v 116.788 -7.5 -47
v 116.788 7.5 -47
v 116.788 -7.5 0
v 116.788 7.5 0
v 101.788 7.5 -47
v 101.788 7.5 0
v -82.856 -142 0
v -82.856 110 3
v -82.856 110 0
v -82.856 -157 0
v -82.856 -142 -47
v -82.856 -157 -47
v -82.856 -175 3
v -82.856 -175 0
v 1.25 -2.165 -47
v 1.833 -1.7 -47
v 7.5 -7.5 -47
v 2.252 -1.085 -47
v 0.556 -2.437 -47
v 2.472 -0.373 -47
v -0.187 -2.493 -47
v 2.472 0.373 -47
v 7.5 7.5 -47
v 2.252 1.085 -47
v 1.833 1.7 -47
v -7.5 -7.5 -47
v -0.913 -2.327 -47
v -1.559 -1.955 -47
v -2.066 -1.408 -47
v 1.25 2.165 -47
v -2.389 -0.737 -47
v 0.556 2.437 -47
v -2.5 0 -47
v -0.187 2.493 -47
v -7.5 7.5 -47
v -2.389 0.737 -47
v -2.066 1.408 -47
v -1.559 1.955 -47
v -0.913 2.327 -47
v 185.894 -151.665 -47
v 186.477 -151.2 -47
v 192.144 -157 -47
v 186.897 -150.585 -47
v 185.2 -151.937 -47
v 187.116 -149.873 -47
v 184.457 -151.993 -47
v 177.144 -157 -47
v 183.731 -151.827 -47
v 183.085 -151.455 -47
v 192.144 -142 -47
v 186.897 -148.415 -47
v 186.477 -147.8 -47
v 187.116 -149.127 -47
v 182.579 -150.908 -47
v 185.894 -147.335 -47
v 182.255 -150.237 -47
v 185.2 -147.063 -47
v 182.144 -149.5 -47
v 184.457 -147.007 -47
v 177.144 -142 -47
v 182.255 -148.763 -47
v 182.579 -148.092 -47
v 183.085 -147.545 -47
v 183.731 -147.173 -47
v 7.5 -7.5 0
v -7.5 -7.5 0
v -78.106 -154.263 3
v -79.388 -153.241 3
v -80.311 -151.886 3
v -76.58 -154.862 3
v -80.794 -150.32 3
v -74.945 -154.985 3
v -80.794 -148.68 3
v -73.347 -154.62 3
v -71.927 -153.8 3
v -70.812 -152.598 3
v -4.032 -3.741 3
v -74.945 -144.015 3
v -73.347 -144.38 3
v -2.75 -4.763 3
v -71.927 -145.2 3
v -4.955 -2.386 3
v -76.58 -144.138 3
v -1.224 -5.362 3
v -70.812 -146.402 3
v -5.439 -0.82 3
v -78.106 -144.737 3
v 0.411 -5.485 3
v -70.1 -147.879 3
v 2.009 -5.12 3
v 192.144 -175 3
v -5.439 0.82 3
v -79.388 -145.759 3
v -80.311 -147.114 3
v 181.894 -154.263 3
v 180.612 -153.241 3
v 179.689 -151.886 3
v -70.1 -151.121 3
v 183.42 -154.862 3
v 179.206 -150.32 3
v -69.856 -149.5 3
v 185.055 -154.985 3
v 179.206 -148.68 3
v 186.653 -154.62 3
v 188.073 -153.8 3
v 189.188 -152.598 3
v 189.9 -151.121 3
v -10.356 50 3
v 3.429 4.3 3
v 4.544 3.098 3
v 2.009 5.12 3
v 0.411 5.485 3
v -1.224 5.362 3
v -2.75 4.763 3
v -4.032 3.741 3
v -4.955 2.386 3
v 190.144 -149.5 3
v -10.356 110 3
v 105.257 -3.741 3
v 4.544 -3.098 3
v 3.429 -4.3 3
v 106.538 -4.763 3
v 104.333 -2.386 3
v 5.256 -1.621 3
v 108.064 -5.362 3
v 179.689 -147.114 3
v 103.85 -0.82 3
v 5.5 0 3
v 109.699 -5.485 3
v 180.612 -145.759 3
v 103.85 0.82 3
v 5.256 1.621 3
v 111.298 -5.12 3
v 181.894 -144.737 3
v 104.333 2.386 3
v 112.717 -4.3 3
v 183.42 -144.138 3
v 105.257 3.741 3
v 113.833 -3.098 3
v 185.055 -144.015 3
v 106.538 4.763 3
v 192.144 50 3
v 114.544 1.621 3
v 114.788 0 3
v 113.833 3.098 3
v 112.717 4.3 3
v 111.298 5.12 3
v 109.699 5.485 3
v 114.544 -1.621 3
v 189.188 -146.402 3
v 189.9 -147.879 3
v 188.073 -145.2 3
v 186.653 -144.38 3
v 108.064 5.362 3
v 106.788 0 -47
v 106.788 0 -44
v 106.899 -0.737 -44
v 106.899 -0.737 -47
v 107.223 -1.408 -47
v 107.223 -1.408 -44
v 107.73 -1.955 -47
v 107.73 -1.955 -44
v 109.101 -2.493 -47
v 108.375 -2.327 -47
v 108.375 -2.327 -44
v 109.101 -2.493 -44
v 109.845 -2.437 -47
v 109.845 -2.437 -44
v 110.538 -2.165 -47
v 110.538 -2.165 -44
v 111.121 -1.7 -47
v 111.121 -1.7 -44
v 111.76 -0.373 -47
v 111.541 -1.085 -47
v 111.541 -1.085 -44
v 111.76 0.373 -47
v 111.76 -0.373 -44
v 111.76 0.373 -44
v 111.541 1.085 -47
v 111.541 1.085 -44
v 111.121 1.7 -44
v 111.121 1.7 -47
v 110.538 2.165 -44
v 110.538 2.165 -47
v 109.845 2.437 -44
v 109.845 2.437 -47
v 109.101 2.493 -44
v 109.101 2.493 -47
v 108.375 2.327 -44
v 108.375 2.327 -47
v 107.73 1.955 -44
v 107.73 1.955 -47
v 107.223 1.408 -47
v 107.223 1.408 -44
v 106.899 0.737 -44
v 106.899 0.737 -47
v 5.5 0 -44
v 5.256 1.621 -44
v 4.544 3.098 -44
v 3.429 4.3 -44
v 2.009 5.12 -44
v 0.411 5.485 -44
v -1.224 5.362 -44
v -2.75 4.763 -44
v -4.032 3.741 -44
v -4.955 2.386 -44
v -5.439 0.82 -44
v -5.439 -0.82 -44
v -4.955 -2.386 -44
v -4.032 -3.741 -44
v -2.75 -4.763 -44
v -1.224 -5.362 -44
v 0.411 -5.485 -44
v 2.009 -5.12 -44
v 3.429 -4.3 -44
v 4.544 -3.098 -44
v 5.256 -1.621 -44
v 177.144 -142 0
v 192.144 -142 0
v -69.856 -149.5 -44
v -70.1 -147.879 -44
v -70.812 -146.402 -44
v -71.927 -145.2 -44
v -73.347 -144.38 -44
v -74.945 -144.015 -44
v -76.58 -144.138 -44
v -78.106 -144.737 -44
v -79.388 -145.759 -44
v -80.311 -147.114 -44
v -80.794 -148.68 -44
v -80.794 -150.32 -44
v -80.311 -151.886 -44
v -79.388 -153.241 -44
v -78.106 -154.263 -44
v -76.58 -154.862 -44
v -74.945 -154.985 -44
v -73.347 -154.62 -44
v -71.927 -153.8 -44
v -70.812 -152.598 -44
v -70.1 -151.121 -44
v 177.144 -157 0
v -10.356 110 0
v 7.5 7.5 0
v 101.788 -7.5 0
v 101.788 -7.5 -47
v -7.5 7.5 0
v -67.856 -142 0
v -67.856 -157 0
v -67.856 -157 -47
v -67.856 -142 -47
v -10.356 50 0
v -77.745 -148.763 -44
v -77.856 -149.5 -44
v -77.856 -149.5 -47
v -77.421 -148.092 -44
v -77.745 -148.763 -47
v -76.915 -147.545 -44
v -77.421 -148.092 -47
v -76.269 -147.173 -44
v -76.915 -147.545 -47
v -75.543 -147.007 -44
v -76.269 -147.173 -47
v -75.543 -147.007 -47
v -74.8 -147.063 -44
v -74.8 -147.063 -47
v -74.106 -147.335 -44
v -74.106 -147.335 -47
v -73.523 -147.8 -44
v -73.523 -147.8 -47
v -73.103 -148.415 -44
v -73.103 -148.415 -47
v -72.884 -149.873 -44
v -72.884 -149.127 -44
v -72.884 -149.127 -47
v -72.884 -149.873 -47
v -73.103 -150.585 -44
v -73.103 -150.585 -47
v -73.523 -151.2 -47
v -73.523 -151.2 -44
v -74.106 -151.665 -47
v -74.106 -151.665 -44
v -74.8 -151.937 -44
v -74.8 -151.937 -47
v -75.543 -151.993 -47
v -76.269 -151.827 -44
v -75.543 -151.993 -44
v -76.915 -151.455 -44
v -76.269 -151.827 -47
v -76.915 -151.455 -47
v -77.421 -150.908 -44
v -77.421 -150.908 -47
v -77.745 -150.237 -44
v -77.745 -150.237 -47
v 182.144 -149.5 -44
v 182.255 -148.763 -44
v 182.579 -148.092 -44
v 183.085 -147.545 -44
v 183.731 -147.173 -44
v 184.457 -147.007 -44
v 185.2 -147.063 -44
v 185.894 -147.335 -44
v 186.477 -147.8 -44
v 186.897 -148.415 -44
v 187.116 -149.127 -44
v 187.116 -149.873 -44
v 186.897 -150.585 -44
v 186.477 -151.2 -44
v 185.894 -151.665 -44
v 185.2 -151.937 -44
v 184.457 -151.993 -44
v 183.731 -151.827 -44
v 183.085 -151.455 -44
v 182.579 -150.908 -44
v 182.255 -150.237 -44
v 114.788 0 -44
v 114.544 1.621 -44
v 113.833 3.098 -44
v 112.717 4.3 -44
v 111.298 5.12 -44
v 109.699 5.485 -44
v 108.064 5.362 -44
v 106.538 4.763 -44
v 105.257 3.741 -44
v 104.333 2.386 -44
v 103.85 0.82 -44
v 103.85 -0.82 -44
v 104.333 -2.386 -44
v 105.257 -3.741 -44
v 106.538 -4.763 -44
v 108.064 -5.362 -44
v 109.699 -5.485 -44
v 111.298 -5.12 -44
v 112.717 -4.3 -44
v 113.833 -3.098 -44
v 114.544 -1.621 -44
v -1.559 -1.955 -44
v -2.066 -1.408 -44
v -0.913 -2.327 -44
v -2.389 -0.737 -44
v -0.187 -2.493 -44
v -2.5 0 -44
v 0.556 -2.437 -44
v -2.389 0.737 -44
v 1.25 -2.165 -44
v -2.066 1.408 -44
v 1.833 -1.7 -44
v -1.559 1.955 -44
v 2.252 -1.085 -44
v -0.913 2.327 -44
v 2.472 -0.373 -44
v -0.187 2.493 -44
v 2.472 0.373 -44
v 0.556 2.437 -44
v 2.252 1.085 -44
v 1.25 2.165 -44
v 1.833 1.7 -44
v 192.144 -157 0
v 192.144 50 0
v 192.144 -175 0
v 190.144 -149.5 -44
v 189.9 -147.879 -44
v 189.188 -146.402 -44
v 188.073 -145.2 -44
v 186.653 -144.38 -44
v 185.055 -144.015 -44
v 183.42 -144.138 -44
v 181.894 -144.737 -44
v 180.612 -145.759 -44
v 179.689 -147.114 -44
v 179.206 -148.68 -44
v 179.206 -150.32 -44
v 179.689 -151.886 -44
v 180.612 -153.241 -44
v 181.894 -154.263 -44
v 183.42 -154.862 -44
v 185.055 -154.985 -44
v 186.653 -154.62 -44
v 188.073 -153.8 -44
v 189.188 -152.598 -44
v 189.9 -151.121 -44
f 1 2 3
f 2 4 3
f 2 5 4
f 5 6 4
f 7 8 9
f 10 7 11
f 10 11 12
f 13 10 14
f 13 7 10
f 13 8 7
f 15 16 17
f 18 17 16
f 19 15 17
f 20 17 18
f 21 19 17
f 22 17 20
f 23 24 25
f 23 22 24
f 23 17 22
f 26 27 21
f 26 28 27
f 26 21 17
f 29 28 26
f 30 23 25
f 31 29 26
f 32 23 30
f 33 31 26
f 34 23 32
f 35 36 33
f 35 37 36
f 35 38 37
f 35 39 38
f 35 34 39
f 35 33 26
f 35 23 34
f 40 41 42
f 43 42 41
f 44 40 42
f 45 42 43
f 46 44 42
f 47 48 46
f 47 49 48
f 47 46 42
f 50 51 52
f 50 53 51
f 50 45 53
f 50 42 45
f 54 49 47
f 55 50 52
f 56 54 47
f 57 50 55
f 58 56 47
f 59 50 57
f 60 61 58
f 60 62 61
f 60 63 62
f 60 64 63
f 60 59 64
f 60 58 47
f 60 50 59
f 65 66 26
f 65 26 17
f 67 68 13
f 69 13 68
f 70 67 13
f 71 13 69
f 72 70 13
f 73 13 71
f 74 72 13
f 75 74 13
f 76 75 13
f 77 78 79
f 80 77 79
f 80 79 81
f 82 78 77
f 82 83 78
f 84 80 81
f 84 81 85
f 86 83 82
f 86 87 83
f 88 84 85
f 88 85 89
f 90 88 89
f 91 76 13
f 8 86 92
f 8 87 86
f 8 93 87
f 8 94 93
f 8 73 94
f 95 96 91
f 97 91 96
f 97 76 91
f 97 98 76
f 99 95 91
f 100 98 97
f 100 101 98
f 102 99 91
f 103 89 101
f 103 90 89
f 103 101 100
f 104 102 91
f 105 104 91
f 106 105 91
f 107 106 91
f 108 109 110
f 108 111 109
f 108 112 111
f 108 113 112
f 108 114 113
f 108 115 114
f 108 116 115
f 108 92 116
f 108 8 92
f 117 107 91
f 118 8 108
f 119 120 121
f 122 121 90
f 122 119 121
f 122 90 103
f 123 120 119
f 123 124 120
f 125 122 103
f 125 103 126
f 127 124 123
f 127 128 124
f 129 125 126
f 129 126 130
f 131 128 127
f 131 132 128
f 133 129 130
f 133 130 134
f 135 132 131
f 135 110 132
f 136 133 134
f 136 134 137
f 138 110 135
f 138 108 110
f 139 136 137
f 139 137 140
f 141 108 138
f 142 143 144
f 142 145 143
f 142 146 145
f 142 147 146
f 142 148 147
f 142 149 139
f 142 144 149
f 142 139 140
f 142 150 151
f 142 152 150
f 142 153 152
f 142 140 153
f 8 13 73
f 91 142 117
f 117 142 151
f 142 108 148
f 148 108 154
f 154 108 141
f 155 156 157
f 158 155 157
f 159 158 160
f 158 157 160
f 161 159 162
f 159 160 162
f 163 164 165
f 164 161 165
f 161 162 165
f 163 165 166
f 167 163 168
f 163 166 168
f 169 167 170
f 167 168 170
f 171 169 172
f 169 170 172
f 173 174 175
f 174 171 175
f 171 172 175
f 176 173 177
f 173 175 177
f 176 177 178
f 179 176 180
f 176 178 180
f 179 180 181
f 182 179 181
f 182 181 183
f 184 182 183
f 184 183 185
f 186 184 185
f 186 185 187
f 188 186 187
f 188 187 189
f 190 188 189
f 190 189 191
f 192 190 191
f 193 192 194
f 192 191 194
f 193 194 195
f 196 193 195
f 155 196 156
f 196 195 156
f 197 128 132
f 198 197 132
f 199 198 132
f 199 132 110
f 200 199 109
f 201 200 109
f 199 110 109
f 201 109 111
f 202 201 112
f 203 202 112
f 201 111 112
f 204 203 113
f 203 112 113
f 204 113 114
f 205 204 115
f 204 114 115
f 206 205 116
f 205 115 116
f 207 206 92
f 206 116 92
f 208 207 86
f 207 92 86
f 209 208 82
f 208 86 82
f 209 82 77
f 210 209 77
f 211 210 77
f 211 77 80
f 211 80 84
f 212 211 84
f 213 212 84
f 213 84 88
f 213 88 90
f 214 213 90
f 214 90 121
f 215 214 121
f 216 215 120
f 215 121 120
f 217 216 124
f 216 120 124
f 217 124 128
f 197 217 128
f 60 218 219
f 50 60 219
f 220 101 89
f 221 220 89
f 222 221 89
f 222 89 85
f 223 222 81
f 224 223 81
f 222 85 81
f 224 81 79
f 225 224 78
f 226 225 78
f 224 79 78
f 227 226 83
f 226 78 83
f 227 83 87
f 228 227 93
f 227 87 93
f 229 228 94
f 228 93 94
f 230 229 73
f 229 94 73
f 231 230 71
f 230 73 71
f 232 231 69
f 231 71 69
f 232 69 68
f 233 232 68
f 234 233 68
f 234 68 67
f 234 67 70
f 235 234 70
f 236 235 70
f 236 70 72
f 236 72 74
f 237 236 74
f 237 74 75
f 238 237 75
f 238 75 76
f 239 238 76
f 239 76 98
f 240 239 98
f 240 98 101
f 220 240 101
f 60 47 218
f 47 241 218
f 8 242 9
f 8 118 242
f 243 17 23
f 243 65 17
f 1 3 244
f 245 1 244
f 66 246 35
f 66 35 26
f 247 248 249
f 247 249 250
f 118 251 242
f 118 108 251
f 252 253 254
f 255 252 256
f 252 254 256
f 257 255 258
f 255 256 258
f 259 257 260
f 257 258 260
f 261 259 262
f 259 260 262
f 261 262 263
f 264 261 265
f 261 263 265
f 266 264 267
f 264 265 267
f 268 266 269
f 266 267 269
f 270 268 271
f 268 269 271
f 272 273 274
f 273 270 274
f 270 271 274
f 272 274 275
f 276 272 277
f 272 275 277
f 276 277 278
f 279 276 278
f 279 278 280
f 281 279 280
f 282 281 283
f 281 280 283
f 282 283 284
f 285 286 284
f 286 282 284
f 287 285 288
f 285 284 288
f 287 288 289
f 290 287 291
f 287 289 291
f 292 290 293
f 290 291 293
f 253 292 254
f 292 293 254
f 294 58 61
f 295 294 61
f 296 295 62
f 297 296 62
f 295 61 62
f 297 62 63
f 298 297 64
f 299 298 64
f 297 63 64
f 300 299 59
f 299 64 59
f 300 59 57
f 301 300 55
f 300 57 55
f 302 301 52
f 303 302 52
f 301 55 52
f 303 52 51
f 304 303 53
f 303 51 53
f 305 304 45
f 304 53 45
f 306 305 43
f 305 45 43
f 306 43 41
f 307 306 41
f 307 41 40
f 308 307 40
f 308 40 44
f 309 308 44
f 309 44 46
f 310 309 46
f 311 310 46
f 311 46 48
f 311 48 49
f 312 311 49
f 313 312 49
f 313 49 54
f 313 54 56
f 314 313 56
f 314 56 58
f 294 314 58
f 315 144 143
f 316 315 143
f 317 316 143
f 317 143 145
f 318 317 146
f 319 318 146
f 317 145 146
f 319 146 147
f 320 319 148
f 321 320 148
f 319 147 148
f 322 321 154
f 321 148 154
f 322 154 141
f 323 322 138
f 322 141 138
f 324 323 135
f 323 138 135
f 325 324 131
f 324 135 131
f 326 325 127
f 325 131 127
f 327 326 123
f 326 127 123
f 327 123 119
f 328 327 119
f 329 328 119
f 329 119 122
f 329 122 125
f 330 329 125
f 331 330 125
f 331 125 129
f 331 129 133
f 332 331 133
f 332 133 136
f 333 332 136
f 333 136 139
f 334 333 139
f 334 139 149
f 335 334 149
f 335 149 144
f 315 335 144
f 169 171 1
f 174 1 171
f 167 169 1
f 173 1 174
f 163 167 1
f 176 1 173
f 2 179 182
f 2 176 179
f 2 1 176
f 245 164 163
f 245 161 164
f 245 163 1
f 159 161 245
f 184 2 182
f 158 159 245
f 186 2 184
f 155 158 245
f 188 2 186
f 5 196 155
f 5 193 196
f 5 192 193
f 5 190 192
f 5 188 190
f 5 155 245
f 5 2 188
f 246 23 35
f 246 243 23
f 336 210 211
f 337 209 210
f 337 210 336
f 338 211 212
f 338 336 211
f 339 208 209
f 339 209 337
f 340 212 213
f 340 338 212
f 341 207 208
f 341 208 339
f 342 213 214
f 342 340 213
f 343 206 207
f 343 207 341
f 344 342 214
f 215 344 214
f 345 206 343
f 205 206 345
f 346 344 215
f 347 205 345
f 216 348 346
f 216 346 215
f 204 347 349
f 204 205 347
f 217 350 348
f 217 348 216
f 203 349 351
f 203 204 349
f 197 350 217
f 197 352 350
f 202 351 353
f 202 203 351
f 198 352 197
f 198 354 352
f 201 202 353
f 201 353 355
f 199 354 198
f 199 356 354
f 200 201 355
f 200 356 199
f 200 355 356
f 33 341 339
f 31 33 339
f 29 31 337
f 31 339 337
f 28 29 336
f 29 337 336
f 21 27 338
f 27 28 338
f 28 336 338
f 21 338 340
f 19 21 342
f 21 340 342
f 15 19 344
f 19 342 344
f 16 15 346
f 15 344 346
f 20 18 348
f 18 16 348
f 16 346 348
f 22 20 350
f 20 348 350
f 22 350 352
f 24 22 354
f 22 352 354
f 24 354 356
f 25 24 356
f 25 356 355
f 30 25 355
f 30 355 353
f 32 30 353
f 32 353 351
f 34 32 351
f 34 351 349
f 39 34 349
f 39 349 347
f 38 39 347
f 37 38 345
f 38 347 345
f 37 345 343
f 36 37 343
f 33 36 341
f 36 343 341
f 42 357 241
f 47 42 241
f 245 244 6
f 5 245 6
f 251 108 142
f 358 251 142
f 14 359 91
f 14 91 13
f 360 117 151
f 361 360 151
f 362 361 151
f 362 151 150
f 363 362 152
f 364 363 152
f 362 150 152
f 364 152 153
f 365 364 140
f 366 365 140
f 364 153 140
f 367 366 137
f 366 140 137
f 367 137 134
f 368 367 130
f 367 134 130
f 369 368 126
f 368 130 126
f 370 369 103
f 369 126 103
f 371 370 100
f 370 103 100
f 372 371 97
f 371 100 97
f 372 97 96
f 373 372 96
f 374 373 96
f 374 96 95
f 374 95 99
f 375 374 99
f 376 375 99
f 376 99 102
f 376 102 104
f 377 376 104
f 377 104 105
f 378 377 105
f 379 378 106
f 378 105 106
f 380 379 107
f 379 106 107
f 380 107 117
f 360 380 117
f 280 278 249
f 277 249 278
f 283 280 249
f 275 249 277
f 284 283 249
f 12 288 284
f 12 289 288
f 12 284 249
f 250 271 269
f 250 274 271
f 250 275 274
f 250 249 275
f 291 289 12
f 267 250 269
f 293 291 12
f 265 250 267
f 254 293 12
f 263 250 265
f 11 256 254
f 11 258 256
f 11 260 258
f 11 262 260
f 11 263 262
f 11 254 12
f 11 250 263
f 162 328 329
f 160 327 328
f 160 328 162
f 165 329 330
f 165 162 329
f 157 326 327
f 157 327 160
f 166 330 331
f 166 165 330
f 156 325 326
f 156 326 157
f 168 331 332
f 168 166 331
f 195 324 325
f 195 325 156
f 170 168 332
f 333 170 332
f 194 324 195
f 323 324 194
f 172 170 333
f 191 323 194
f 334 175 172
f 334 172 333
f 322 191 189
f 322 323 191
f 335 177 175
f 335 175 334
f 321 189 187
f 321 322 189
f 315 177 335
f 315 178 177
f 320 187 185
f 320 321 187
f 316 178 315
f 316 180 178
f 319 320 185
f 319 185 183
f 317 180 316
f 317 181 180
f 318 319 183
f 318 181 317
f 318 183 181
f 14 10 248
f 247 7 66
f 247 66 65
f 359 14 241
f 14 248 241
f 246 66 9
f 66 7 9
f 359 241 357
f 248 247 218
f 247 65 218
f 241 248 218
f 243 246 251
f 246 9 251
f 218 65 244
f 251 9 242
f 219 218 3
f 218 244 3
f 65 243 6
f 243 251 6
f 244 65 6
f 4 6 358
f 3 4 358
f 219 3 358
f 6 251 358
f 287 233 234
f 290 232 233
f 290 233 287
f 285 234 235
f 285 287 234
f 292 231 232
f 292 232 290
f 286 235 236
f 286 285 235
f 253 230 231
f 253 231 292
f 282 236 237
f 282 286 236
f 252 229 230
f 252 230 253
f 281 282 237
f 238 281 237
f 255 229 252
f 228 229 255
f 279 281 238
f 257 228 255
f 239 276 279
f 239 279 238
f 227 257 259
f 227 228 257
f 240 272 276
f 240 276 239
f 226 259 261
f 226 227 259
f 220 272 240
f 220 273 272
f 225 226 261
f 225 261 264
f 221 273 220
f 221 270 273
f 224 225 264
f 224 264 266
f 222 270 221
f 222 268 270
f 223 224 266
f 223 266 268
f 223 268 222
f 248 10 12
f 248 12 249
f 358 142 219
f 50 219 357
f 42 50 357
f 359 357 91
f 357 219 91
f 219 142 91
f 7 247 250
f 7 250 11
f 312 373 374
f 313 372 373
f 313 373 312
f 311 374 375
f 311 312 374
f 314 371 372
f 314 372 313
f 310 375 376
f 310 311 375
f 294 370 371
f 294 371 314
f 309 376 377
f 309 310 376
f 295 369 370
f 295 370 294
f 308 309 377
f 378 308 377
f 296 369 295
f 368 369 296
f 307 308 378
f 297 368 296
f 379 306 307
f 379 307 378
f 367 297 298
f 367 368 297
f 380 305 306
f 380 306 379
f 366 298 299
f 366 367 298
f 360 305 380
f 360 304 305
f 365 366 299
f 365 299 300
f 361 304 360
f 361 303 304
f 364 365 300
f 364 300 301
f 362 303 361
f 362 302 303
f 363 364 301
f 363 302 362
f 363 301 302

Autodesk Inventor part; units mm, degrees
ref_plane "YZ Plane" through (0, 0, 0) normal (1, 0, 0) x (0, 1, 0)
ref_plane "XZ Plane" through (0, 0, 0) normal (0, 1, 0) x (-1, 0, 0)
ref_plane "XY Plane" through (0, 0, 0) normal (0, 0, 1) x (1, 0, 0)
sketch "Sketch1" plane through (0, 0, 0) normal (0, 0, 1) x (1, 0, 0)
  circle A0 centre (0, 0) radius 2.5
  circle A1 centre (109.2883, 0) radius 2.5
  line L0 (-82.8559, 30) -> (192.1441, 30)
  line L1 (192.1441, 30) -> (192.1441, -175)
  line L2 (192.1441, -175) -> (-82.8559, -175)
  line L3 (-82.8559, -175) -> (-82.8559, 30)
  line L4 (0, 0) -> (109.2883, 0) construction
  point P0 (54.6441, 0)
  point P1 (54.6441, 30)
  dimension "d0" = 5
  dimension "d1" = 5
  dimension "d2" = 109.2883
  dimension "d3" = 275
  dimension "d4" = 30
  dimension "d5" = 175
extrude "Extrusion1" add sketch "Sketch1" along normal blind 3
sketch "Sketch4" plane through (0, 0, 0) normal (0, 0, -1) x (-1, 0, 0)
  circle A0 centre (-109.2883, 0) radius 2.5 projected
  line L0 (-116.7883, -7.5) -> (-101.7883, -7.5)
  line L1 (-101.7883, -7.5) -> (-101.7883, 7.5)
  line L2 (-101.7883, 7.5) -> (-116.7883, 7.5)
  line L3 (-116.7883, 7.5) -> (-116.7883, -7.5)
  circle A1 centre (-109.2883, 0) radius 2.5 projected
  line L4 (-116.7883, -7.5) -> (-101.7883, 7.5) construction
  line L5 (-101.7883, -7.5) -> (-116.7883, 7.5) construction
  line L6 (7.5, -7.5) -> (-7.5, -7.5)
  line L7 (-7.5, -7.5) -> (-7.5, 7.5)
  line L8 (-7.5, 7.5) -> (7.5, 7.5)
  line L9 (7.5, 7.5) -> (7.5, -7.5)
  circle A2 centre (0, 0) radius 2.5 projected
  line L10 (7.5, -7.5) -> (-7.5, 7.5) construction
  line L11 (-7.5, -7.5) -> (7.5, 7.5) construction
  dimension "d14" = 15
  dimension "d15" = 15
  dimension "d16" = 15
  dimension "d17" = 15
extrude "Extrusion4" add sketch "Sketch4" along normal blind 47
sketch "Sketch5" plane through (0, 0, 3) normal (0, 0, 1) x (1, 0, 0)
  circle A0 centre (0, 0) radius 2.5 projected
  circle A1 centre (109.2883, 0) radius 2.5 projected
  circle A2 centre (0, 0) radius 5.5
  circle A3 centre (109.2883, 0) radius 5.5
  dimension "d20" = 11
  dimension "d21" = 11
extrude "Extrusion5" cut sketch "Sketch5" against normal blind 47
sketch "Sketch6" plane through (0, 0, 0) normal (0, 0, -1) x (-1, 0, 0)
  line L0 (-192.1441, 30) -> (-192.1441, -175) projected
  line L1 (-192.1441, -157) -> (-177.1441, -157)
  line L2 (-177.1441, -157) -> (-177.1441, -142)
  line L3 (-177.1441, -142) -> (-192.1441, -142)
  line L4 (-192.1441, -142) -> (-192.1441, -157)
  line L5 (82.8559, -175) -> (82.8559, 30) projected
  line L6 (82.8559, -157) -> (67.8559, -157)
  line L7 (67.8559, -157) -> (67.8559, -142)
  line L8 (67.8559, -142) -> (82.8559, -142)
  line L9 (82.8559, -142) -> (82.8559, -157)
  line L10 (-192.1441, -175) -> (82.8559, -175) projected
  point P0 (0, 0)
  dimension "d24" = 15
  dimension "d25" = 15
  dimension "d26" = 15
  dimension "d27" = 15
  dimension "d28" = 18
extrude "Extrusion6" add sketch "Sketch6" along normal blind 47
sketch "Sketch7" plane through (0, 0, 3) normal (0, 0, 1) x (1, 0, 0)
  line L0 (-10.3559, 30) -> (-82.8559, 30)
  line L1 (-82.8559, 30) -> (-10.3559, 30)
  line L2 (-10.3559, 30) -> (-10.3559, 110)
  line L3 (-10.3559, 110) -> (-82.8559, 110)
  line L4 (-82.8559, 110) -> (-82.8559, 30)
  line L5 (-82.8559, 30) -> (-82.8559, -175) projected
  point P0 (0, 0)
  dimension "d31" = 80
  dimension "d42" = 72.5
extrude "Extrusion7" add sketch "Sketch7" against normal blind 3
sketch "Sketch8" plane through (0, 0, -47) normal (0, 0, -1) x (-1, 0, 0)
  line L0 (-192.1441, -157) -> (-177.1441, -157) projected
  line L1 (-177.1441, -157) -> (-177.1441, -142) projected
  line L2 (-177.1441, -142) -> (-192.1441, -142) projected
  line L3 (-192.1441, -142) -> (-192.1441, -157) projected
  line L4 (82.8559, -157) -> (82.8559, -142) projected
  line L5 (82.8559, -142) -> (67.8559, -142) projected
  line L6 (67.8559, -142) -> (67.8559, -157) projected
  line L7 (67.8559, -157) -> (82.8559, -157) projected
  circle A0 centre (-184.6441, -149.5) radius 2.5
  circle A1 centre (75.3559, -149.5) radius 2.5
  point P0 (0, 0)
  point P1 (75.3559, -157)
  point P2 (-184.6441, -157)
  point P3 (-177.1441, -149.5)
  point P4 (67.8559, -149.5)
  dimension "d34" = 5
  dimension "d35" = 5
extrude "Extrusion8" cut sketch "Sketch8" against normal through all contours A0 | A1
sketch "Sketch9" plane through (0, 0, 3) normal (0, 0, 1) x (1, 0, 0)
  circle A0 centre (-75.3559, -149.5) radius 2.5 projected
  circle A1 centre (184.6441, -149.5) radius 2.5 projected
  circle A2 centre (-75.3559, -149.5) radius 5.5
  circle A3 centre (184.6441, -149.5) radius 5.5
  point P0 (0, 0)
  dimension "d38" = 11
  dimension "d39" = 11
extrude "Extrusion9" cut sketch "Sketch9" against normal blind 47
sketch "Sketch10" plane through (0, 0, 3) normal (0, 0, 1) x (1, 0, 0)
  line L0 (192.1441, 30) -> (-10.3559, 30) projected
  line L1 (-10.3559, 30) -> (-10.3559, 110) projected
  line L2 (-10.3559, 30) -> (192.1441, 30) projected
  line L3 (-10.3559, 110) -> (-10.3559, 30) projected
  line L4 (192.1441, 30) -> (-10.3559, 30)
  line L5 (-10.3559, 30) -> (-10.3559, 50)
  line L6 (-10.3559, 50) -> (192.1441, 50)
  line L7 (192.1441, 50) -> (192.1441, 30)
  point P0 (0, 0)
  dimension "d43" = 20
extrude "Extrusion10" add sketch "Sketch10" against normal blind 3
properties part number "BP013" material "ABS Plastic"
